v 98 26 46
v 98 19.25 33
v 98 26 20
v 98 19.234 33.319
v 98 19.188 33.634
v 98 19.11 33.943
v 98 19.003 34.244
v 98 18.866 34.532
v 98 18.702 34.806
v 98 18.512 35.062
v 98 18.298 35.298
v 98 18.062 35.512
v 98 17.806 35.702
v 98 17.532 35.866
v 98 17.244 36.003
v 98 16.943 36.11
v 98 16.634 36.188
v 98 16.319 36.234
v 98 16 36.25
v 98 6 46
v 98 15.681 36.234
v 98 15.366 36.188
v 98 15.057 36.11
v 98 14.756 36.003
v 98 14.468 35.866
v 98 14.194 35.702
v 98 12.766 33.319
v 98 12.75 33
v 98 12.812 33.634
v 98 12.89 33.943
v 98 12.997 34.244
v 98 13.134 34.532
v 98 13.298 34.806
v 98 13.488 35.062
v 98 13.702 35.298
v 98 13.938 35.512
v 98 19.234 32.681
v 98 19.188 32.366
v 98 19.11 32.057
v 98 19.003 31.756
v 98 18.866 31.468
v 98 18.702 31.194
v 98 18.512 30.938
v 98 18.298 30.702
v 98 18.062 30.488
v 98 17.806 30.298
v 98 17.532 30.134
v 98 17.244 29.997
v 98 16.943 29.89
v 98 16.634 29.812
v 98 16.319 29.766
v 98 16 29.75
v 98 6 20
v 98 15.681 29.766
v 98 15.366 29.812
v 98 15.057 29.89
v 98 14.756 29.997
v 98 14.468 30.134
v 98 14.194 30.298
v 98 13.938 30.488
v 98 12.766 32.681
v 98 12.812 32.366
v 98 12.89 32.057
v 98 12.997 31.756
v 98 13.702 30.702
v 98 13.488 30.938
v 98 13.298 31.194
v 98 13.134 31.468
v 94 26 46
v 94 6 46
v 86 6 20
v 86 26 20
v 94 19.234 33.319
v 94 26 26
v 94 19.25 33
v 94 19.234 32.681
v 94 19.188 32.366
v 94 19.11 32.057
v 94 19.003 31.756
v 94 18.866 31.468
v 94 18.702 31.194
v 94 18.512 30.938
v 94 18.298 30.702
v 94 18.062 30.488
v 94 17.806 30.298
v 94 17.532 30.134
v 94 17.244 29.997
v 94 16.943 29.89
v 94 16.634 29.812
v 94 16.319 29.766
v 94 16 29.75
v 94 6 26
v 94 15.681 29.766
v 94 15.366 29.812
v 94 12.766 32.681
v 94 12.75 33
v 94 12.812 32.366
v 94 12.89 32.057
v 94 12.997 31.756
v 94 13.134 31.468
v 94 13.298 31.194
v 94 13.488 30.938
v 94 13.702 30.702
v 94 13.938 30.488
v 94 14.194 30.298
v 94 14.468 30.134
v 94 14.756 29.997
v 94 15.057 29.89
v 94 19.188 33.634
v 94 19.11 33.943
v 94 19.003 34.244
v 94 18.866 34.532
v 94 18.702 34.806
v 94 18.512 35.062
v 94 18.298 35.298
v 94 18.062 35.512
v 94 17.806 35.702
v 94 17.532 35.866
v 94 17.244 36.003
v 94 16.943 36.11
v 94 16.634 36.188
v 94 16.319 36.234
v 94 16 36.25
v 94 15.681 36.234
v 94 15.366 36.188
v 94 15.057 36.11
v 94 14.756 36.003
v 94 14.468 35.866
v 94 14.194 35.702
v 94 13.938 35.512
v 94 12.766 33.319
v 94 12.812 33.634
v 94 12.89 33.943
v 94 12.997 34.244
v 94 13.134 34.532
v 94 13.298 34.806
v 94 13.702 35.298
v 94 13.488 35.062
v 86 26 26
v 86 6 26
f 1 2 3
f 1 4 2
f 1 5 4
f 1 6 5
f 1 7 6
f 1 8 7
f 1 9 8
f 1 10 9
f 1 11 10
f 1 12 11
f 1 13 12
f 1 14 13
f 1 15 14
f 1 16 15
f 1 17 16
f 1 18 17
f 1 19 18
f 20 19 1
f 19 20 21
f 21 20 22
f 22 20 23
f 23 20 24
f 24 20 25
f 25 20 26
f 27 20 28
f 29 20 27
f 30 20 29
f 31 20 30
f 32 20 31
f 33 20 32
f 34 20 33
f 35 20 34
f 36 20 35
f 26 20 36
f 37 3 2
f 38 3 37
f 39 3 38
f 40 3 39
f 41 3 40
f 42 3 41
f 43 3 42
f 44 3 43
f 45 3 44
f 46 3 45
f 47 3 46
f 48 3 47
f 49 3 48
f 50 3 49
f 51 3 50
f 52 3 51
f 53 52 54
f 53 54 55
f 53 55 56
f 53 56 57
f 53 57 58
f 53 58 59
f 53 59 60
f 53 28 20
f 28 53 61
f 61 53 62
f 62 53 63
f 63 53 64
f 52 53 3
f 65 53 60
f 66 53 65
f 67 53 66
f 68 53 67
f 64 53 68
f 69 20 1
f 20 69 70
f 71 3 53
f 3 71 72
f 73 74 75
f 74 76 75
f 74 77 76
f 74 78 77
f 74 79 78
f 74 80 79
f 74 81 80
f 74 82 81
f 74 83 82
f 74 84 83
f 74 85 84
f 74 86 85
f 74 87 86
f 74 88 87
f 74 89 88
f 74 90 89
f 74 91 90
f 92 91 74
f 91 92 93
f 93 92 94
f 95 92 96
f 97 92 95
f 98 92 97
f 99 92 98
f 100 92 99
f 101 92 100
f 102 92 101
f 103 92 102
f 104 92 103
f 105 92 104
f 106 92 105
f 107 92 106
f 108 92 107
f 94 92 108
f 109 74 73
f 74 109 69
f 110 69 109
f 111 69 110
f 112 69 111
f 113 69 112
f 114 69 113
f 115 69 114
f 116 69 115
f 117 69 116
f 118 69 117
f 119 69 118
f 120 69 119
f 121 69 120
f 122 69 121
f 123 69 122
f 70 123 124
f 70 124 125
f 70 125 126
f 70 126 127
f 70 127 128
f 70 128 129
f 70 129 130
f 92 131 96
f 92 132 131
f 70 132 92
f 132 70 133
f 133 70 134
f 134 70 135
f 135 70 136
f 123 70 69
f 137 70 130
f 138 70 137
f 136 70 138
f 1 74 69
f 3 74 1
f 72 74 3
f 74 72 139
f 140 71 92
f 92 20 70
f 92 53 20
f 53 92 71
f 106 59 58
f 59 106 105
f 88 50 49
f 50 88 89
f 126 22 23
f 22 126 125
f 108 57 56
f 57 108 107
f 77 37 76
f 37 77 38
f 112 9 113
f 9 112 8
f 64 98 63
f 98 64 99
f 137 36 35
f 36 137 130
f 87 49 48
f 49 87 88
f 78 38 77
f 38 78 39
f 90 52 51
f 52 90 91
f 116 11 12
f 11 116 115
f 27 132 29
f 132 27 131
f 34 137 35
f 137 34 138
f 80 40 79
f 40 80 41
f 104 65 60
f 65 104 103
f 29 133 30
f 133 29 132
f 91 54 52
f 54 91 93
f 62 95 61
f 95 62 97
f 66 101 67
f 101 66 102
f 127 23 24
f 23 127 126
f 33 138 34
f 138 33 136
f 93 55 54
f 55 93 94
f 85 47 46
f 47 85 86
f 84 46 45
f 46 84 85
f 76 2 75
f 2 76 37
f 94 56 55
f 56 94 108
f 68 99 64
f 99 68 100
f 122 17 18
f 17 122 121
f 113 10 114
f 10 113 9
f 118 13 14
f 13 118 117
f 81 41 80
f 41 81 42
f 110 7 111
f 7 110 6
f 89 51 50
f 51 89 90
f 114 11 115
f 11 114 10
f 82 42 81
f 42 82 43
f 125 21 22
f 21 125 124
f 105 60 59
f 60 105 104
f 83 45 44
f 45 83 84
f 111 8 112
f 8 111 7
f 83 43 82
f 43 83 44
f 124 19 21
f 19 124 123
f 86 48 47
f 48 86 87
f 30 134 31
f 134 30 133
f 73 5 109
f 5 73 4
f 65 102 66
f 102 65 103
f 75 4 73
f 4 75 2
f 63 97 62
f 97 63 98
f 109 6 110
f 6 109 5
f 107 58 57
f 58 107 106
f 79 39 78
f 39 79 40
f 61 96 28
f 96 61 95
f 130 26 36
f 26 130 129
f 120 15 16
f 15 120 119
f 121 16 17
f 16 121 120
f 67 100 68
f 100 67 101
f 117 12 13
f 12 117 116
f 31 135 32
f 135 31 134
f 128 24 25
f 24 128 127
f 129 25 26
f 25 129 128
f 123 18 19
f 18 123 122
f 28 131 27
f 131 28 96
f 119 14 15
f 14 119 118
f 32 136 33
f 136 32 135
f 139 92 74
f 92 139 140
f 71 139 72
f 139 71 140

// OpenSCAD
// file: config.scad
// ============================================================
//  config.scad — shared dimensions (single source of truth)
//  Every other file includes this. Change a number here and
//  the part files AND the assembly update together.
//  Units: mm.  Z is up.
// ============================================================

/* ----- rack ----- */
U       = 44.45;
span_U  = 6;
span    = span_U * U;        // 266.7 — spine length / mount span
post_t  = 4;
post_w  = 25;

/* ----- fan ----- */
fan_size  = 120;
fan_thick = 25;
fan_pitch = 105;
fan_hole_d = 4.5;            // M4 clearance (anti-vibration washers under the head)
bore_d    = 112;

/* ----- carrier ----- */
thickness       = 6;         // one thickness -> flat part (print or waterjet/CNC)
frame_corner_r  = 4;
gap_to_spine    = 6;
mount_bolt_d    = 5.5;       // M5 clearance into T-nuts
mount_bolt_span = 90;
slot_travel     = 6;
flange_height   = 100;

/* ----- spine (2020) ----- */
ext_width  = 20;

/* ----- fan heights along the rail ----- */
fan1_z = fan_size/2 + 5;
fan2_z = span - fan_size/2 - 5;

/* ----- derived placement (shared by carrier + spine + bracket) ----- */
spine_face_x   = fan_size/2 + gap_to_spine;   // 66
spine_center_x = spine_face_x + ext_width/2;  // 76
wing_x0        = fan_size/2 - 4;              // 56
wing_x1        = spine_face_x + ext_width;    // 86
post_x         = wing_x1 + 12;                // 98 (post inner face)

$fn = 64;
eps = 0.01;
// main file
// ============================================================
//  bracket.scad — rack-mount bracket (post -> spine)
//  Bolts to the rack post with an M6 cage nut, reaches to the spine.
//  bracket(zb) places one at vertical height zb.
// ============================================================
include <config.scad>

module bracket(zb) {
    color("Teal") union() {
        // pad against the post, M6 hole through it (along X)
        difference() {
            translate([post_x - 4, thickness, zb]) cube([4, ext_width, 26]);
            translate([post_x - 6, thickness + ext_width/2, zb + 13])
                rotate([0, 90, 0]) cylinder(h = 8, d = 6.5);
        }
        // arm reaching back to the spine
        translate([wing_x1, thickness, zb])
            cube([post_x - 4 - wing_x1, ext_width, 6]);
    }
}

bracket(20);
